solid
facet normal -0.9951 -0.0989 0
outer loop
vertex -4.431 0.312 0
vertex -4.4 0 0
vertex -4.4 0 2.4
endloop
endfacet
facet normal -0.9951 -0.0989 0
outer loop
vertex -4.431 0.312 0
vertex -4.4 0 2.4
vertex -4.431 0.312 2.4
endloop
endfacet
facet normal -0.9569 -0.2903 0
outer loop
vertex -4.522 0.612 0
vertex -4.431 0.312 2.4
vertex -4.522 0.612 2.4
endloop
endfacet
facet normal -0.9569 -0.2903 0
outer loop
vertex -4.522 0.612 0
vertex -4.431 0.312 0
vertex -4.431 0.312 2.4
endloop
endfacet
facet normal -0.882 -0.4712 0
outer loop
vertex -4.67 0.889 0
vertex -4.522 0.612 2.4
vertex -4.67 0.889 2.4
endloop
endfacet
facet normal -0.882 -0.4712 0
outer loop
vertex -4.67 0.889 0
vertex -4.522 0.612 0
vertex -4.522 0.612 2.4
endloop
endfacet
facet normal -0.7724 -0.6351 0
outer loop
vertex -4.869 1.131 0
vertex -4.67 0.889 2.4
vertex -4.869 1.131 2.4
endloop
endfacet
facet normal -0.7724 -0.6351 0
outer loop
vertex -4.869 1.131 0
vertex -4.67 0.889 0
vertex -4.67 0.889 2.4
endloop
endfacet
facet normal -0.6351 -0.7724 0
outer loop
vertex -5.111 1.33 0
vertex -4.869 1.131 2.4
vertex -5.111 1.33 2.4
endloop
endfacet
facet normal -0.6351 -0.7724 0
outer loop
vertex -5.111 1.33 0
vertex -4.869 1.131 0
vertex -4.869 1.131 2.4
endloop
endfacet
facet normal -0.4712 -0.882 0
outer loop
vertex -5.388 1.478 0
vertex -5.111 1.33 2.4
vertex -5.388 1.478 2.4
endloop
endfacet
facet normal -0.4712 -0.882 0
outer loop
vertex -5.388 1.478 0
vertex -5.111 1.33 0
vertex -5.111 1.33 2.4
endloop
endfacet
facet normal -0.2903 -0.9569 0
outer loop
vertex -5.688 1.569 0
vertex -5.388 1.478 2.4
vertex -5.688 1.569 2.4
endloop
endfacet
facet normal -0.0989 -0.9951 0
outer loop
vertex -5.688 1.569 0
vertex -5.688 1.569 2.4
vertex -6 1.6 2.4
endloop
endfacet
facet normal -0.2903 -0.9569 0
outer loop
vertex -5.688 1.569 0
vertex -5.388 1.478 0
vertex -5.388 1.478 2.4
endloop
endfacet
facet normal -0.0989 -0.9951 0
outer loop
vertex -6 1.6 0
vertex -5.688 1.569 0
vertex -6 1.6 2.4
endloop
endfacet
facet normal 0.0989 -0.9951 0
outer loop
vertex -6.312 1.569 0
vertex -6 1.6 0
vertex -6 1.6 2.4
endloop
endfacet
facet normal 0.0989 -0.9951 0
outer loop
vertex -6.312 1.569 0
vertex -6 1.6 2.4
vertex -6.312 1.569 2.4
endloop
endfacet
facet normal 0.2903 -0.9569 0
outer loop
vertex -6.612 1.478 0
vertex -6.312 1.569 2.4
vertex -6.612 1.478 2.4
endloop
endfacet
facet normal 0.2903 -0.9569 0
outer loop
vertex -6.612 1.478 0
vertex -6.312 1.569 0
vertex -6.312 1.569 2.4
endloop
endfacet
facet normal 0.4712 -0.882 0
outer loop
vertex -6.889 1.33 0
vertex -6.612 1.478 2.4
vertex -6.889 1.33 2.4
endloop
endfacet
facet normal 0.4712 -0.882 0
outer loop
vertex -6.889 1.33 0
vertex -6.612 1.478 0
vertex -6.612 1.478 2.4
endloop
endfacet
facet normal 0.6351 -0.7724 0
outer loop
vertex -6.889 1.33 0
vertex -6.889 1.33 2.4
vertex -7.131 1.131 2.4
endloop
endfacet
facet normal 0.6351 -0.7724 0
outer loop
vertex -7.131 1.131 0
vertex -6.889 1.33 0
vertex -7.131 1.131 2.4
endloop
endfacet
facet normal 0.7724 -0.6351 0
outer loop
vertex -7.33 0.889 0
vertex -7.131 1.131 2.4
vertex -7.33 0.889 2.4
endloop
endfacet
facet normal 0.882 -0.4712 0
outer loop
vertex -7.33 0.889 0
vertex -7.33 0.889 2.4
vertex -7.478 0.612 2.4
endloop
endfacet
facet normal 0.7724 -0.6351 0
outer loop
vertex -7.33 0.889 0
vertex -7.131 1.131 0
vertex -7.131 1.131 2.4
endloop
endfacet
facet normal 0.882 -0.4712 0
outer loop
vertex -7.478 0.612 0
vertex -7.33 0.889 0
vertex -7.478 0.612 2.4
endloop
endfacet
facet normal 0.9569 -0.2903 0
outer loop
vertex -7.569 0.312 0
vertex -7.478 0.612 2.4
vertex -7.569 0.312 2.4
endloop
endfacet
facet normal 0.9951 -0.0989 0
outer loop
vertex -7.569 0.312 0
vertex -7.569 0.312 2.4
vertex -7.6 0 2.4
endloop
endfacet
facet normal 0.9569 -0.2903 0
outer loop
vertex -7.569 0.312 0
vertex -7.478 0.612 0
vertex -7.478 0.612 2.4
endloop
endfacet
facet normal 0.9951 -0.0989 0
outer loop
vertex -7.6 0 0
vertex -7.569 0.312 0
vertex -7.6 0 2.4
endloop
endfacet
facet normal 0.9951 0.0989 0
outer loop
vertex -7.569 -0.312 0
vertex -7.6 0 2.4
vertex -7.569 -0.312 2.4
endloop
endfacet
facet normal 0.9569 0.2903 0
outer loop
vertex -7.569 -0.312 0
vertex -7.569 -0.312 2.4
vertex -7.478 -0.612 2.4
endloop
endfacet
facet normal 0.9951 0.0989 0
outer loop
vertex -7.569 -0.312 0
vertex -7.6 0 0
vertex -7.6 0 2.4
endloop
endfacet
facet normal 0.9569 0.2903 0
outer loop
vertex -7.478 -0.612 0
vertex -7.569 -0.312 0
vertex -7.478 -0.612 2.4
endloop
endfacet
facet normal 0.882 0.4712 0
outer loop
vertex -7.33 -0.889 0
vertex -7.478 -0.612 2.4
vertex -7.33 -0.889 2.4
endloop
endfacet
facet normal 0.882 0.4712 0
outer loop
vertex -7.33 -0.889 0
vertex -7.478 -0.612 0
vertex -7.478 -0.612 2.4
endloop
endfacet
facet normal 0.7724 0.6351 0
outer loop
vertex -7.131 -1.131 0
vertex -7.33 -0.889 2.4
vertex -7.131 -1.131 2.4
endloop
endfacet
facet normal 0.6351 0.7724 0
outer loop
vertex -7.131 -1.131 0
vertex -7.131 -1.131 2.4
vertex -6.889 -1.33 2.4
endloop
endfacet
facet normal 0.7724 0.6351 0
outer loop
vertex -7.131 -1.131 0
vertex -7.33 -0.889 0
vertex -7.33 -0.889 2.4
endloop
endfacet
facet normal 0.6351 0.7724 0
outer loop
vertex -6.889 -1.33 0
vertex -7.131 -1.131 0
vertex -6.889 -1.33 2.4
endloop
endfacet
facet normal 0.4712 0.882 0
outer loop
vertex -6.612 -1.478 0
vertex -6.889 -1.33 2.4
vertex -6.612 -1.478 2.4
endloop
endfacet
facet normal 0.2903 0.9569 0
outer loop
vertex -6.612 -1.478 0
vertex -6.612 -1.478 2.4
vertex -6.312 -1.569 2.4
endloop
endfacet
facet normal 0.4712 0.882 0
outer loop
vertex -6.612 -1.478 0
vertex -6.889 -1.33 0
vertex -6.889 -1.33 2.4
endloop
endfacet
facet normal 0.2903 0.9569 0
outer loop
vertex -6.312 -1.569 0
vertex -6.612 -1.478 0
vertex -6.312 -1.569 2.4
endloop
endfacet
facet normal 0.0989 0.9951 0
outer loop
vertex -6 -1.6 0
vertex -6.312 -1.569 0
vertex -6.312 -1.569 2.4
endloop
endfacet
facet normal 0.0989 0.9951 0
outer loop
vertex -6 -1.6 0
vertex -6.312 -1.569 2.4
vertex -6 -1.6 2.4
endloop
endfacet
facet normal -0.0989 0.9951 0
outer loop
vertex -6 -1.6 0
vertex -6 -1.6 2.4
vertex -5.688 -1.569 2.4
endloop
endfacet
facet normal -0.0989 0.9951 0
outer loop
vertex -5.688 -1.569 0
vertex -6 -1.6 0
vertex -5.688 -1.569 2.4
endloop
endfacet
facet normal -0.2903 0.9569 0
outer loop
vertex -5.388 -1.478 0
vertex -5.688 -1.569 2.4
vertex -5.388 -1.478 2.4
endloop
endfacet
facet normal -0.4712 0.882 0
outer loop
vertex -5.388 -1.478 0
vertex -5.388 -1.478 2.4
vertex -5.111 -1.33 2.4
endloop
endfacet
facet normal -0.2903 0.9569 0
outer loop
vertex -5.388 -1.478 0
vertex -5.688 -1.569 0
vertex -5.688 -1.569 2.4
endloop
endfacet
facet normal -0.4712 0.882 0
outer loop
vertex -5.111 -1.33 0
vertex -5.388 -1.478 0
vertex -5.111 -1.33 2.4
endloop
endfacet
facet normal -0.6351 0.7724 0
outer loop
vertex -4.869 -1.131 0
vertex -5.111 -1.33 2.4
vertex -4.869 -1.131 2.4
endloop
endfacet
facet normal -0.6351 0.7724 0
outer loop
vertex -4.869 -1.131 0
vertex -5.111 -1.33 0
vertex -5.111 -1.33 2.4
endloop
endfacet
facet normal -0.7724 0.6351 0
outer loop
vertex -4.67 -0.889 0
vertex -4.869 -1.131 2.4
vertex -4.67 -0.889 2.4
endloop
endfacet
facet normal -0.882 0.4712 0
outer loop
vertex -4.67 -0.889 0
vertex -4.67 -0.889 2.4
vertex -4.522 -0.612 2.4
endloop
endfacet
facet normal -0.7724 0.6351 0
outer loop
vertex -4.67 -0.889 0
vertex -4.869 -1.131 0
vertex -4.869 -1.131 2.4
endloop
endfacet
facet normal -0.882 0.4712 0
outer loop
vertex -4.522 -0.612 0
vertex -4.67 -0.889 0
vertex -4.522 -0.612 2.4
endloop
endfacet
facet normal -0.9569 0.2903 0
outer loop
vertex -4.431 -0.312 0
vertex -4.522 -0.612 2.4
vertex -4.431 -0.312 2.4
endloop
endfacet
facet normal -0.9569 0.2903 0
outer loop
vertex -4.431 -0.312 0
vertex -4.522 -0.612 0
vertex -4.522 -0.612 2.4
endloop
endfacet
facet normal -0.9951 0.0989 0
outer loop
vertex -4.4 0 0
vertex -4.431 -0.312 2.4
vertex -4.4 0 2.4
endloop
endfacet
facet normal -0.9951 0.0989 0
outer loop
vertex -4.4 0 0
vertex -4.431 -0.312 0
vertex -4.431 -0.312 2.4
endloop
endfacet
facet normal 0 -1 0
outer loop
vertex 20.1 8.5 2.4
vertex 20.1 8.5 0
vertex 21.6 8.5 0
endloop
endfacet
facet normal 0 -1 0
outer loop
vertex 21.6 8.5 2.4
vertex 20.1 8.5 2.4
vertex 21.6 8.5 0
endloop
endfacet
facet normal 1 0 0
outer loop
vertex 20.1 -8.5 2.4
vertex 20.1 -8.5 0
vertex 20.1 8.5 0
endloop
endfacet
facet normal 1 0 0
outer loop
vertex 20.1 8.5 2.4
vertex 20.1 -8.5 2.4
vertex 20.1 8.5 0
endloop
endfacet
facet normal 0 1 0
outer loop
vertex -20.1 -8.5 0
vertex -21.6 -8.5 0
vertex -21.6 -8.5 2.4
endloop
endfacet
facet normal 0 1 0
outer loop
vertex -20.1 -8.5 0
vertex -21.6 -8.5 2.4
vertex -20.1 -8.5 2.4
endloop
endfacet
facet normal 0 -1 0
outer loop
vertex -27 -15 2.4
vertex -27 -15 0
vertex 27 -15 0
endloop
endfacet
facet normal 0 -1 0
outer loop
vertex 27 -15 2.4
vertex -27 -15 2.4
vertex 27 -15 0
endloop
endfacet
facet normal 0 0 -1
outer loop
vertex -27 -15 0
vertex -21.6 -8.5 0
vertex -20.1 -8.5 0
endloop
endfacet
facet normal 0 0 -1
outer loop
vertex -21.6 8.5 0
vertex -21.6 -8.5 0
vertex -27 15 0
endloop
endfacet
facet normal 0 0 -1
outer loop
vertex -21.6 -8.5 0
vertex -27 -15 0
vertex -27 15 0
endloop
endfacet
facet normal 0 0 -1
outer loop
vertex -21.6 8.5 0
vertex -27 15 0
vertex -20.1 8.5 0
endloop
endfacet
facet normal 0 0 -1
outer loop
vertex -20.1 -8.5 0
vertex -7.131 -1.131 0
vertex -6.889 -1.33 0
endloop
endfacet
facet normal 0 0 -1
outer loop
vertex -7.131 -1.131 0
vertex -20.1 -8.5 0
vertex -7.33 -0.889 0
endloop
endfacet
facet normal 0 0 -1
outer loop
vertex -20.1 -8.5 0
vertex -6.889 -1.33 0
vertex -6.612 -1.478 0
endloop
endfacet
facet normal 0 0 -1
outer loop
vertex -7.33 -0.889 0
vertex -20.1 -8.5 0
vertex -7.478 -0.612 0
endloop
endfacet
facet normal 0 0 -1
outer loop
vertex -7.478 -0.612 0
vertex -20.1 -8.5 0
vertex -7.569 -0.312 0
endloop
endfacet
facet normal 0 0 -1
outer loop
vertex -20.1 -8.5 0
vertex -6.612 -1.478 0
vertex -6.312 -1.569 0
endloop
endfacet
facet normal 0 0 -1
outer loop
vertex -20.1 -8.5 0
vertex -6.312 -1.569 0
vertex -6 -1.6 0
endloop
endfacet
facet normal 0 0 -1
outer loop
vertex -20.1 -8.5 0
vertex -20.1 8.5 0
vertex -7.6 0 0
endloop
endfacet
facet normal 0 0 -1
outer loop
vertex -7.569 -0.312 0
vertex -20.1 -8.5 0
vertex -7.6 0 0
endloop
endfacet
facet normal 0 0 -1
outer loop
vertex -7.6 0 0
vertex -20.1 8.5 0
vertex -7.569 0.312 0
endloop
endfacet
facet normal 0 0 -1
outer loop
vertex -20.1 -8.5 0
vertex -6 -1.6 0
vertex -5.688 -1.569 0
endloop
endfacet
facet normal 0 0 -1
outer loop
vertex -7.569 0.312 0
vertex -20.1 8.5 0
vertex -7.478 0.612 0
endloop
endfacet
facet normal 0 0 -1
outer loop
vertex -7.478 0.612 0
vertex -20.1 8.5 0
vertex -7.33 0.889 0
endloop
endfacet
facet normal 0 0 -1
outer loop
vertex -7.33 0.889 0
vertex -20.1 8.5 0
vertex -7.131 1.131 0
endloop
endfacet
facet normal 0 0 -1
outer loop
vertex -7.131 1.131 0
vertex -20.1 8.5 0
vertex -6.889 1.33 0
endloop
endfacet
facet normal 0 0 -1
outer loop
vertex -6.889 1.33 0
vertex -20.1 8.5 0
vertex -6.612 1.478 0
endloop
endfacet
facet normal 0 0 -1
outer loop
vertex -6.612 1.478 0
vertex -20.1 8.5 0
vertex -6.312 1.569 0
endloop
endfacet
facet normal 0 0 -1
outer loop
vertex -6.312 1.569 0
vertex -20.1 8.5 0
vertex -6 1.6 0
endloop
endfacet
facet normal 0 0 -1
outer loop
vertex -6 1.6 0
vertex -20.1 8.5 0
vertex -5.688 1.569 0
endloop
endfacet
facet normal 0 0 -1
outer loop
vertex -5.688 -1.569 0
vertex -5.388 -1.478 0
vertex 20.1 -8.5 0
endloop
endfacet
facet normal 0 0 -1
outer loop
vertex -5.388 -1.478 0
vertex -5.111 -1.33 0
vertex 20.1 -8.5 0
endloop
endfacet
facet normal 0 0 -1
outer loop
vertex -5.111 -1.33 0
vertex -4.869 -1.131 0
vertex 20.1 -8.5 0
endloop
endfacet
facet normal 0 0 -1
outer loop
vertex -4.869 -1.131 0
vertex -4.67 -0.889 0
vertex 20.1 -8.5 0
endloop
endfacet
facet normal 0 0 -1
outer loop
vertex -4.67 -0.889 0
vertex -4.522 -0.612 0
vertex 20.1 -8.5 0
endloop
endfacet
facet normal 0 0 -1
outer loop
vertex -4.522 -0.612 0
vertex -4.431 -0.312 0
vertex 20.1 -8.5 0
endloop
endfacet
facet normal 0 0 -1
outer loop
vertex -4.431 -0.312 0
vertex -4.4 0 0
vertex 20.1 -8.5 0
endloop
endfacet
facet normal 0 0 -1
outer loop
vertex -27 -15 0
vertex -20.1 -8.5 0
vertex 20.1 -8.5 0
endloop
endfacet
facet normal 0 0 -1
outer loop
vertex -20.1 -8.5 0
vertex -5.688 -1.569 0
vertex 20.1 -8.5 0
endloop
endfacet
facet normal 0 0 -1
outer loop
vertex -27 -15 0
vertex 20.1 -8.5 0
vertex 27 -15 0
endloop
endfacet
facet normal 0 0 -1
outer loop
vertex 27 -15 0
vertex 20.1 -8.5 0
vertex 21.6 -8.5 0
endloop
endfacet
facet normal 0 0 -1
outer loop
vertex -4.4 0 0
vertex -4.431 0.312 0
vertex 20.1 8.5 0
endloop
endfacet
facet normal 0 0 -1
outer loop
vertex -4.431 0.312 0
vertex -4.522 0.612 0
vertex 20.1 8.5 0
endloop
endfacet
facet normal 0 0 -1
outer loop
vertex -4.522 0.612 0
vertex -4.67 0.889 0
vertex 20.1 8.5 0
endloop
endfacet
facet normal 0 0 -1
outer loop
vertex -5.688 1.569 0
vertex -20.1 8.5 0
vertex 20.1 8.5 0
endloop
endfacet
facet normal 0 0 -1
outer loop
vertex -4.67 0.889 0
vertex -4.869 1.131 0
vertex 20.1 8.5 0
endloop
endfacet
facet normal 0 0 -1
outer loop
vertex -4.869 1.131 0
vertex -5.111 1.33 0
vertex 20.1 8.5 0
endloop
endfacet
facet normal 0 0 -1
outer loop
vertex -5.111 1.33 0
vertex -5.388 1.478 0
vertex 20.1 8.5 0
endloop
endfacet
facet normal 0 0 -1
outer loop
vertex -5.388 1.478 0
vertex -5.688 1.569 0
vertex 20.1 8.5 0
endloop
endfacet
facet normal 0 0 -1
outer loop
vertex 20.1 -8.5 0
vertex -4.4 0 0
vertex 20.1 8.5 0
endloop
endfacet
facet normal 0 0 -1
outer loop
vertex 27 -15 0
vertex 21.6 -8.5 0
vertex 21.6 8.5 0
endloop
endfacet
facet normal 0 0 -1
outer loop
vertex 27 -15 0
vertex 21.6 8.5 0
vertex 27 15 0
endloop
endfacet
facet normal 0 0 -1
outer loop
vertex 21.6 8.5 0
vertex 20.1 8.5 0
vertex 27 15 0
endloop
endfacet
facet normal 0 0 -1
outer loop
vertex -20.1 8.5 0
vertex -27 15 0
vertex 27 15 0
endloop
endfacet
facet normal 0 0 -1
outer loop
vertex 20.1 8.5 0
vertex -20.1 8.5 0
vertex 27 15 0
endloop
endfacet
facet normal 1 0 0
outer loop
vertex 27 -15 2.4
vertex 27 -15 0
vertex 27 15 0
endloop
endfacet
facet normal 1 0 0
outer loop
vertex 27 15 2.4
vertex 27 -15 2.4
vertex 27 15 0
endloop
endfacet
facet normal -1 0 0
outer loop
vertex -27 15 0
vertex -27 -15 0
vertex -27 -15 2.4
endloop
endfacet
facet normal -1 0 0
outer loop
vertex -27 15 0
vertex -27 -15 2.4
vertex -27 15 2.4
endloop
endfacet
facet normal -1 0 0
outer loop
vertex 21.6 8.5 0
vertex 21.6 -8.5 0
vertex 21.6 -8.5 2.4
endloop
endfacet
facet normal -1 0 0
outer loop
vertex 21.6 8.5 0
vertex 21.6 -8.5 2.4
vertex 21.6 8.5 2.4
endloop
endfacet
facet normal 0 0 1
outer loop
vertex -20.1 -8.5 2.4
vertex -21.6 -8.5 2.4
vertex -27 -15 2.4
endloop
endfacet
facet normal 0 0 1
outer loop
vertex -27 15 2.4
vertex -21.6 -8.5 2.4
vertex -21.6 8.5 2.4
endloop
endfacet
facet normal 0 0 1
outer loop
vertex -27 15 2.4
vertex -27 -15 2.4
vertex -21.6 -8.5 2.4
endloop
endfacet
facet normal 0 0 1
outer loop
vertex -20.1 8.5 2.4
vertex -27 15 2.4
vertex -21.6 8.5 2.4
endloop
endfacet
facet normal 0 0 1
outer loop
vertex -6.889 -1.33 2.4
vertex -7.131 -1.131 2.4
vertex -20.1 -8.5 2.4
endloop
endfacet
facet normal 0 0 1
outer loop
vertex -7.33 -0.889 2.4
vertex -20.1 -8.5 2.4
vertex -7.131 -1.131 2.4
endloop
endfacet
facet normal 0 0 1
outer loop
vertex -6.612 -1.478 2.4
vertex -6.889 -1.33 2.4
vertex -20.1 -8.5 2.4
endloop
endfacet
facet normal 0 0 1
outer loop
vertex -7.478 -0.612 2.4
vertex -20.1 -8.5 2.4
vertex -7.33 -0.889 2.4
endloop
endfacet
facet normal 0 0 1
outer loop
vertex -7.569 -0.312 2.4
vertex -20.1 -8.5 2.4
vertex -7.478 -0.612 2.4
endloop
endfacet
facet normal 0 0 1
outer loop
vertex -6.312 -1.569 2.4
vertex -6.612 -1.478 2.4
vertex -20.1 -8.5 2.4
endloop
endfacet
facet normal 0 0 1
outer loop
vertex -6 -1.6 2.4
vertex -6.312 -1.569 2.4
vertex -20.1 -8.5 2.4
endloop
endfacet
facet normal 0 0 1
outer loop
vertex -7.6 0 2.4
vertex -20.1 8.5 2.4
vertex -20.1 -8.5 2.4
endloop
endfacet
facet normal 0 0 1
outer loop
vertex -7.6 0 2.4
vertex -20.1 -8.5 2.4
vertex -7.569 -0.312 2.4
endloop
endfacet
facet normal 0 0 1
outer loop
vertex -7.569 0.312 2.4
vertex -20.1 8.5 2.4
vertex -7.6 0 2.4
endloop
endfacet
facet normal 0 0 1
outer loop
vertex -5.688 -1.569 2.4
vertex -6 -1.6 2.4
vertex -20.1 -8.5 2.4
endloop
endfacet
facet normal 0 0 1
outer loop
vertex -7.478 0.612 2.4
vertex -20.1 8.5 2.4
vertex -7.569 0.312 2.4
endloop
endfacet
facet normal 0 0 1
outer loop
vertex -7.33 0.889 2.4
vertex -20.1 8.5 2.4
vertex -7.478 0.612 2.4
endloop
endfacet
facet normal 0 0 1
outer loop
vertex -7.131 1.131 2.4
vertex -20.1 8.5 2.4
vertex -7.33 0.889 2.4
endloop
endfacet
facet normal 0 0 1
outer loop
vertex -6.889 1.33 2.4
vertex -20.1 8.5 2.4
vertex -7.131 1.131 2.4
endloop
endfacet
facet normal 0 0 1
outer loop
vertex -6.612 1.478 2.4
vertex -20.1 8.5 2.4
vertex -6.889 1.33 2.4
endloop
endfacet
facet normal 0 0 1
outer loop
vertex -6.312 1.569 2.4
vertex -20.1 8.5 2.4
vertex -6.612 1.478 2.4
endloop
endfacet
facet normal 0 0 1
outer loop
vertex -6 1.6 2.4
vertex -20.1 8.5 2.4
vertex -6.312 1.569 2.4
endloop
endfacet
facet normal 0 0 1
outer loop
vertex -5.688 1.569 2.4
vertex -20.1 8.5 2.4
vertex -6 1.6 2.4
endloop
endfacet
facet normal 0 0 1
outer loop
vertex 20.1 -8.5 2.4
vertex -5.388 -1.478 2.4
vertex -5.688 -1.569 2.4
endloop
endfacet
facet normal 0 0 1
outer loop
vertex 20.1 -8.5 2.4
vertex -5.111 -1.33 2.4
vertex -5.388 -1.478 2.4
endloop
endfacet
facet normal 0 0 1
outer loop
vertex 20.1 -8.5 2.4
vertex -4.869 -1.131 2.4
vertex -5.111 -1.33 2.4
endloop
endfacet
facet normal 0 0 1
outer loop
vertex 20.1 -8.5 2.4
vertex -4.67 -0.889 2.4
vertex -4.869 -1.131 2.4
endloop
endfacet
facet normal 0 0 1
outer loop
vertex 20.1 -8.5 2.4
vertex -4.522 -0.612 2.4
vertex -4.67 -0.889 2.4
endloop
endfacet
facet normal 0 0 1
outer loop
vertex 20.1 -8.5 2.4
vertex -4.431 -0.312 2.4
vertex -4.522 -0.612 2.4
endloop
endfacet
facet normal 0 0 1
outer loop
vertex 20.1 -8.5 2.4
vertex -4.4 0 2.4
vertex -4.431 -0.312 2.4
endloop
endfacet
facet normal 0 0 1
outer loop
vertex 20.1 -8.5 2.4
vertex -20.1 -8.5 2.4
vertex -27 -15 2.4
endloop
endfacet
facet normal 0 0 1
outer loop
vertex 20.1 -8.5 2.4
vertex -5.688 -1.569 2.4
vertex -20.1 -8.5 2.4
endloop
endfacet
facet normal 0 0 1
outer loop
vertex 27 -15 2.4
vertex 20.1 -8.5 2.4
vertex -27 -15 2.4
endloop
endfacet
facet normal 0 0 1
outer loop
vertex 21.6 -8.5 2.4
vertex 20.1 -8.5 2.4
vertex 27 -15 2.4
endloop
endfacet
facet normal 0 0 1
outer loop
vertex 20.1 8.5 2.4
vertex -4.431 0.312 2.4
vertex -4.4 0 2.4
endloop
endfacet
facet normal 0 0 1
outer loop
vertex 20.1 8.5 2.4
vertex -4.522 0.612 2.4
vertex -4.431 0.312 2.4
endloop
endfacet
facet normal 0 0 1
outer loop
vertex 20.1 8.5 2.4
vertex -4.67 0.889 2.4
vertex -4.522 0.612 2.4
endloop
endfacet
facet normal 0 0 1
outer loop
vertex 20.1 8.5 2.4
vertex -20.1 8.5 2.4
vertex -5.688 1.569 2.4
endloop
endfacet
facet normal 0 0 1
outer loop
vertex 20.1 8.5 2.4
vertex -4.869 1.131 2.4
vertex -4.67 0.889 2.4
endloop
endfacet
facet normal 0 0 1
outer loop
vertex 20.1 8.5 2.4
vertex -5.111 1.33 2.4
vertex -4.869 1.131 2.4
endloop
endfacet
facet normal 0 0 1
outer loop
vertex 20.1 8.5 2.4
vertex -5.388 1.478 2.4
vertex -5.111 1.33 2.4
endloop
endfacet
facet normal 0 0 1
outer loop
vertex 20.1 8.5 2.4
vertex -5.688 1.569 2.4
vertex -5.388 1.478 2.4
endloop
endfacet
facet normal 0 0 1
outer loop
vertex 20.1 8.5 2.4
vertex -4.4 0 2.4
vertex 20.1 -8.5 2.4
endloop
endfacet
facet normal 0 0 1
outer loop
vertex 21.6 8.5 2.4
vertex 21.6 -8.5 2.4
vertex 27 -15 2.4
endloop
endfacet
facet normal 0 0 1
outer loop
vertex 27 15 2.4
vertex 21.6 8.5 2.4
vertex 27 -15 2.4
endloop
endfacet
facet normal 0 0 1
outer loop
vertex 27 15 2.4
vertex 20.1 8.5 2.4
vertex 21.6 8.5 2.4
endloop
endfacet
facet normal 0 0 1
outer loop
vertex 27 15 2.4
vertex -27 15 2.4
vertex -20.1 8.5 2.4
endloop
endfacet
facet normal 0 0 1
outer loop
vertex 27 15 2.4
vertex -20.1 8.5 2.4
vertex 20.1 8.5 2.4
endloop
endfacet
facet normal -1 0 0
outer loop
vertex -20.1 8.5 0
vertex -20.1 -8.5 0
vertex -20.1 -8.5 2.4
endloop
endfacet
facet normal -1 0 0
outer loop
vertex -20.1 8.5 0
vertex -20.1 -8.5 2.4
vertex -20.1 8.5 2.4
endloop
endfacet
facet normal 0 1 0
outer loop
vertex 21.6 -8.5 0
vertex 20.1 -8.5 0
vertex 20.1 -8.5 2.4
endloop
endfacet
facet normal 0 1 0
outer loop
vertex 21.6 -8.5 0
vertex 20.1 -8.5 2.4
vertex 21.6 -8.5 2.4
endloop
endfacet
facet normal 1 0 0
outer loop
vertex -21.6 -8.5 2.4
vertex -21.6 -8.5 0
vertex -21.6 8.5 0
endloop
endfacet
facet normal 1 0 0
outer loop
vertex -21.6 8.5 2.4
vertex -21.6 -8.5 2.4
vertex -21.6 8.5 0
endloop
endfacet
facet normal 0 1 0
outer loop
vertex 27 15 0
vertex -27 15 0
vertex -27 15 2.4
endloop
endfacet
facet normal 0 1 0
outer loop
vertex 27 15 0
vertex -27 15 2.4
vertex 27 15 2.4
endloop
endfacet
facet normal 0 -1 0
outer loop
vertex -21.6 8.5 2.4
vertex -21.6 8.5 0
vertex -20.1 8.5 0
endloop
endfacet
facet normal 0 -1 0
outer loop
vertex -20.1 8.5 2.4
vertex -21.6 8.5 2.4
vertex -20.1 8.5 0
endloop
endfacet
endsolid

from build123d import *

# Parameters (mm, degrees)
SKETCH1_W           = 54
SKETCH1_H           = 30
SKETCH1_W_2         = 1.5
SKETCH1_H_2         = 17
SKETCH1_R           = 1.6
BOSS_EXTRUDE1_DEPTH = 2.4


with BuildPart() as part:
    # Sketch1 → Boss-Extrude1 (new body)
    with BuildSketch(Plane.XY):
        Rectangle(SKETCH1_W, SKETCH1_H)
        with Locations((-20.85, 0)):
            Rectangle(SKETCH1_W_2, SKETCH1_H_2, mode=Mode.SUBTRACT)
        with Locations((20.85, 0)):
            Rectangle(SKETCH1_W_2, SKETCH1_H_2, mode=Mode.SUBTRACT)
        with Locations((-6, 0)):
            Circle(SKETCH1_R, mode=Mode.SUBTRACT)
    extrude(amount=BOSS_EXTRUDE1_DEPTH)


solid = part.part
